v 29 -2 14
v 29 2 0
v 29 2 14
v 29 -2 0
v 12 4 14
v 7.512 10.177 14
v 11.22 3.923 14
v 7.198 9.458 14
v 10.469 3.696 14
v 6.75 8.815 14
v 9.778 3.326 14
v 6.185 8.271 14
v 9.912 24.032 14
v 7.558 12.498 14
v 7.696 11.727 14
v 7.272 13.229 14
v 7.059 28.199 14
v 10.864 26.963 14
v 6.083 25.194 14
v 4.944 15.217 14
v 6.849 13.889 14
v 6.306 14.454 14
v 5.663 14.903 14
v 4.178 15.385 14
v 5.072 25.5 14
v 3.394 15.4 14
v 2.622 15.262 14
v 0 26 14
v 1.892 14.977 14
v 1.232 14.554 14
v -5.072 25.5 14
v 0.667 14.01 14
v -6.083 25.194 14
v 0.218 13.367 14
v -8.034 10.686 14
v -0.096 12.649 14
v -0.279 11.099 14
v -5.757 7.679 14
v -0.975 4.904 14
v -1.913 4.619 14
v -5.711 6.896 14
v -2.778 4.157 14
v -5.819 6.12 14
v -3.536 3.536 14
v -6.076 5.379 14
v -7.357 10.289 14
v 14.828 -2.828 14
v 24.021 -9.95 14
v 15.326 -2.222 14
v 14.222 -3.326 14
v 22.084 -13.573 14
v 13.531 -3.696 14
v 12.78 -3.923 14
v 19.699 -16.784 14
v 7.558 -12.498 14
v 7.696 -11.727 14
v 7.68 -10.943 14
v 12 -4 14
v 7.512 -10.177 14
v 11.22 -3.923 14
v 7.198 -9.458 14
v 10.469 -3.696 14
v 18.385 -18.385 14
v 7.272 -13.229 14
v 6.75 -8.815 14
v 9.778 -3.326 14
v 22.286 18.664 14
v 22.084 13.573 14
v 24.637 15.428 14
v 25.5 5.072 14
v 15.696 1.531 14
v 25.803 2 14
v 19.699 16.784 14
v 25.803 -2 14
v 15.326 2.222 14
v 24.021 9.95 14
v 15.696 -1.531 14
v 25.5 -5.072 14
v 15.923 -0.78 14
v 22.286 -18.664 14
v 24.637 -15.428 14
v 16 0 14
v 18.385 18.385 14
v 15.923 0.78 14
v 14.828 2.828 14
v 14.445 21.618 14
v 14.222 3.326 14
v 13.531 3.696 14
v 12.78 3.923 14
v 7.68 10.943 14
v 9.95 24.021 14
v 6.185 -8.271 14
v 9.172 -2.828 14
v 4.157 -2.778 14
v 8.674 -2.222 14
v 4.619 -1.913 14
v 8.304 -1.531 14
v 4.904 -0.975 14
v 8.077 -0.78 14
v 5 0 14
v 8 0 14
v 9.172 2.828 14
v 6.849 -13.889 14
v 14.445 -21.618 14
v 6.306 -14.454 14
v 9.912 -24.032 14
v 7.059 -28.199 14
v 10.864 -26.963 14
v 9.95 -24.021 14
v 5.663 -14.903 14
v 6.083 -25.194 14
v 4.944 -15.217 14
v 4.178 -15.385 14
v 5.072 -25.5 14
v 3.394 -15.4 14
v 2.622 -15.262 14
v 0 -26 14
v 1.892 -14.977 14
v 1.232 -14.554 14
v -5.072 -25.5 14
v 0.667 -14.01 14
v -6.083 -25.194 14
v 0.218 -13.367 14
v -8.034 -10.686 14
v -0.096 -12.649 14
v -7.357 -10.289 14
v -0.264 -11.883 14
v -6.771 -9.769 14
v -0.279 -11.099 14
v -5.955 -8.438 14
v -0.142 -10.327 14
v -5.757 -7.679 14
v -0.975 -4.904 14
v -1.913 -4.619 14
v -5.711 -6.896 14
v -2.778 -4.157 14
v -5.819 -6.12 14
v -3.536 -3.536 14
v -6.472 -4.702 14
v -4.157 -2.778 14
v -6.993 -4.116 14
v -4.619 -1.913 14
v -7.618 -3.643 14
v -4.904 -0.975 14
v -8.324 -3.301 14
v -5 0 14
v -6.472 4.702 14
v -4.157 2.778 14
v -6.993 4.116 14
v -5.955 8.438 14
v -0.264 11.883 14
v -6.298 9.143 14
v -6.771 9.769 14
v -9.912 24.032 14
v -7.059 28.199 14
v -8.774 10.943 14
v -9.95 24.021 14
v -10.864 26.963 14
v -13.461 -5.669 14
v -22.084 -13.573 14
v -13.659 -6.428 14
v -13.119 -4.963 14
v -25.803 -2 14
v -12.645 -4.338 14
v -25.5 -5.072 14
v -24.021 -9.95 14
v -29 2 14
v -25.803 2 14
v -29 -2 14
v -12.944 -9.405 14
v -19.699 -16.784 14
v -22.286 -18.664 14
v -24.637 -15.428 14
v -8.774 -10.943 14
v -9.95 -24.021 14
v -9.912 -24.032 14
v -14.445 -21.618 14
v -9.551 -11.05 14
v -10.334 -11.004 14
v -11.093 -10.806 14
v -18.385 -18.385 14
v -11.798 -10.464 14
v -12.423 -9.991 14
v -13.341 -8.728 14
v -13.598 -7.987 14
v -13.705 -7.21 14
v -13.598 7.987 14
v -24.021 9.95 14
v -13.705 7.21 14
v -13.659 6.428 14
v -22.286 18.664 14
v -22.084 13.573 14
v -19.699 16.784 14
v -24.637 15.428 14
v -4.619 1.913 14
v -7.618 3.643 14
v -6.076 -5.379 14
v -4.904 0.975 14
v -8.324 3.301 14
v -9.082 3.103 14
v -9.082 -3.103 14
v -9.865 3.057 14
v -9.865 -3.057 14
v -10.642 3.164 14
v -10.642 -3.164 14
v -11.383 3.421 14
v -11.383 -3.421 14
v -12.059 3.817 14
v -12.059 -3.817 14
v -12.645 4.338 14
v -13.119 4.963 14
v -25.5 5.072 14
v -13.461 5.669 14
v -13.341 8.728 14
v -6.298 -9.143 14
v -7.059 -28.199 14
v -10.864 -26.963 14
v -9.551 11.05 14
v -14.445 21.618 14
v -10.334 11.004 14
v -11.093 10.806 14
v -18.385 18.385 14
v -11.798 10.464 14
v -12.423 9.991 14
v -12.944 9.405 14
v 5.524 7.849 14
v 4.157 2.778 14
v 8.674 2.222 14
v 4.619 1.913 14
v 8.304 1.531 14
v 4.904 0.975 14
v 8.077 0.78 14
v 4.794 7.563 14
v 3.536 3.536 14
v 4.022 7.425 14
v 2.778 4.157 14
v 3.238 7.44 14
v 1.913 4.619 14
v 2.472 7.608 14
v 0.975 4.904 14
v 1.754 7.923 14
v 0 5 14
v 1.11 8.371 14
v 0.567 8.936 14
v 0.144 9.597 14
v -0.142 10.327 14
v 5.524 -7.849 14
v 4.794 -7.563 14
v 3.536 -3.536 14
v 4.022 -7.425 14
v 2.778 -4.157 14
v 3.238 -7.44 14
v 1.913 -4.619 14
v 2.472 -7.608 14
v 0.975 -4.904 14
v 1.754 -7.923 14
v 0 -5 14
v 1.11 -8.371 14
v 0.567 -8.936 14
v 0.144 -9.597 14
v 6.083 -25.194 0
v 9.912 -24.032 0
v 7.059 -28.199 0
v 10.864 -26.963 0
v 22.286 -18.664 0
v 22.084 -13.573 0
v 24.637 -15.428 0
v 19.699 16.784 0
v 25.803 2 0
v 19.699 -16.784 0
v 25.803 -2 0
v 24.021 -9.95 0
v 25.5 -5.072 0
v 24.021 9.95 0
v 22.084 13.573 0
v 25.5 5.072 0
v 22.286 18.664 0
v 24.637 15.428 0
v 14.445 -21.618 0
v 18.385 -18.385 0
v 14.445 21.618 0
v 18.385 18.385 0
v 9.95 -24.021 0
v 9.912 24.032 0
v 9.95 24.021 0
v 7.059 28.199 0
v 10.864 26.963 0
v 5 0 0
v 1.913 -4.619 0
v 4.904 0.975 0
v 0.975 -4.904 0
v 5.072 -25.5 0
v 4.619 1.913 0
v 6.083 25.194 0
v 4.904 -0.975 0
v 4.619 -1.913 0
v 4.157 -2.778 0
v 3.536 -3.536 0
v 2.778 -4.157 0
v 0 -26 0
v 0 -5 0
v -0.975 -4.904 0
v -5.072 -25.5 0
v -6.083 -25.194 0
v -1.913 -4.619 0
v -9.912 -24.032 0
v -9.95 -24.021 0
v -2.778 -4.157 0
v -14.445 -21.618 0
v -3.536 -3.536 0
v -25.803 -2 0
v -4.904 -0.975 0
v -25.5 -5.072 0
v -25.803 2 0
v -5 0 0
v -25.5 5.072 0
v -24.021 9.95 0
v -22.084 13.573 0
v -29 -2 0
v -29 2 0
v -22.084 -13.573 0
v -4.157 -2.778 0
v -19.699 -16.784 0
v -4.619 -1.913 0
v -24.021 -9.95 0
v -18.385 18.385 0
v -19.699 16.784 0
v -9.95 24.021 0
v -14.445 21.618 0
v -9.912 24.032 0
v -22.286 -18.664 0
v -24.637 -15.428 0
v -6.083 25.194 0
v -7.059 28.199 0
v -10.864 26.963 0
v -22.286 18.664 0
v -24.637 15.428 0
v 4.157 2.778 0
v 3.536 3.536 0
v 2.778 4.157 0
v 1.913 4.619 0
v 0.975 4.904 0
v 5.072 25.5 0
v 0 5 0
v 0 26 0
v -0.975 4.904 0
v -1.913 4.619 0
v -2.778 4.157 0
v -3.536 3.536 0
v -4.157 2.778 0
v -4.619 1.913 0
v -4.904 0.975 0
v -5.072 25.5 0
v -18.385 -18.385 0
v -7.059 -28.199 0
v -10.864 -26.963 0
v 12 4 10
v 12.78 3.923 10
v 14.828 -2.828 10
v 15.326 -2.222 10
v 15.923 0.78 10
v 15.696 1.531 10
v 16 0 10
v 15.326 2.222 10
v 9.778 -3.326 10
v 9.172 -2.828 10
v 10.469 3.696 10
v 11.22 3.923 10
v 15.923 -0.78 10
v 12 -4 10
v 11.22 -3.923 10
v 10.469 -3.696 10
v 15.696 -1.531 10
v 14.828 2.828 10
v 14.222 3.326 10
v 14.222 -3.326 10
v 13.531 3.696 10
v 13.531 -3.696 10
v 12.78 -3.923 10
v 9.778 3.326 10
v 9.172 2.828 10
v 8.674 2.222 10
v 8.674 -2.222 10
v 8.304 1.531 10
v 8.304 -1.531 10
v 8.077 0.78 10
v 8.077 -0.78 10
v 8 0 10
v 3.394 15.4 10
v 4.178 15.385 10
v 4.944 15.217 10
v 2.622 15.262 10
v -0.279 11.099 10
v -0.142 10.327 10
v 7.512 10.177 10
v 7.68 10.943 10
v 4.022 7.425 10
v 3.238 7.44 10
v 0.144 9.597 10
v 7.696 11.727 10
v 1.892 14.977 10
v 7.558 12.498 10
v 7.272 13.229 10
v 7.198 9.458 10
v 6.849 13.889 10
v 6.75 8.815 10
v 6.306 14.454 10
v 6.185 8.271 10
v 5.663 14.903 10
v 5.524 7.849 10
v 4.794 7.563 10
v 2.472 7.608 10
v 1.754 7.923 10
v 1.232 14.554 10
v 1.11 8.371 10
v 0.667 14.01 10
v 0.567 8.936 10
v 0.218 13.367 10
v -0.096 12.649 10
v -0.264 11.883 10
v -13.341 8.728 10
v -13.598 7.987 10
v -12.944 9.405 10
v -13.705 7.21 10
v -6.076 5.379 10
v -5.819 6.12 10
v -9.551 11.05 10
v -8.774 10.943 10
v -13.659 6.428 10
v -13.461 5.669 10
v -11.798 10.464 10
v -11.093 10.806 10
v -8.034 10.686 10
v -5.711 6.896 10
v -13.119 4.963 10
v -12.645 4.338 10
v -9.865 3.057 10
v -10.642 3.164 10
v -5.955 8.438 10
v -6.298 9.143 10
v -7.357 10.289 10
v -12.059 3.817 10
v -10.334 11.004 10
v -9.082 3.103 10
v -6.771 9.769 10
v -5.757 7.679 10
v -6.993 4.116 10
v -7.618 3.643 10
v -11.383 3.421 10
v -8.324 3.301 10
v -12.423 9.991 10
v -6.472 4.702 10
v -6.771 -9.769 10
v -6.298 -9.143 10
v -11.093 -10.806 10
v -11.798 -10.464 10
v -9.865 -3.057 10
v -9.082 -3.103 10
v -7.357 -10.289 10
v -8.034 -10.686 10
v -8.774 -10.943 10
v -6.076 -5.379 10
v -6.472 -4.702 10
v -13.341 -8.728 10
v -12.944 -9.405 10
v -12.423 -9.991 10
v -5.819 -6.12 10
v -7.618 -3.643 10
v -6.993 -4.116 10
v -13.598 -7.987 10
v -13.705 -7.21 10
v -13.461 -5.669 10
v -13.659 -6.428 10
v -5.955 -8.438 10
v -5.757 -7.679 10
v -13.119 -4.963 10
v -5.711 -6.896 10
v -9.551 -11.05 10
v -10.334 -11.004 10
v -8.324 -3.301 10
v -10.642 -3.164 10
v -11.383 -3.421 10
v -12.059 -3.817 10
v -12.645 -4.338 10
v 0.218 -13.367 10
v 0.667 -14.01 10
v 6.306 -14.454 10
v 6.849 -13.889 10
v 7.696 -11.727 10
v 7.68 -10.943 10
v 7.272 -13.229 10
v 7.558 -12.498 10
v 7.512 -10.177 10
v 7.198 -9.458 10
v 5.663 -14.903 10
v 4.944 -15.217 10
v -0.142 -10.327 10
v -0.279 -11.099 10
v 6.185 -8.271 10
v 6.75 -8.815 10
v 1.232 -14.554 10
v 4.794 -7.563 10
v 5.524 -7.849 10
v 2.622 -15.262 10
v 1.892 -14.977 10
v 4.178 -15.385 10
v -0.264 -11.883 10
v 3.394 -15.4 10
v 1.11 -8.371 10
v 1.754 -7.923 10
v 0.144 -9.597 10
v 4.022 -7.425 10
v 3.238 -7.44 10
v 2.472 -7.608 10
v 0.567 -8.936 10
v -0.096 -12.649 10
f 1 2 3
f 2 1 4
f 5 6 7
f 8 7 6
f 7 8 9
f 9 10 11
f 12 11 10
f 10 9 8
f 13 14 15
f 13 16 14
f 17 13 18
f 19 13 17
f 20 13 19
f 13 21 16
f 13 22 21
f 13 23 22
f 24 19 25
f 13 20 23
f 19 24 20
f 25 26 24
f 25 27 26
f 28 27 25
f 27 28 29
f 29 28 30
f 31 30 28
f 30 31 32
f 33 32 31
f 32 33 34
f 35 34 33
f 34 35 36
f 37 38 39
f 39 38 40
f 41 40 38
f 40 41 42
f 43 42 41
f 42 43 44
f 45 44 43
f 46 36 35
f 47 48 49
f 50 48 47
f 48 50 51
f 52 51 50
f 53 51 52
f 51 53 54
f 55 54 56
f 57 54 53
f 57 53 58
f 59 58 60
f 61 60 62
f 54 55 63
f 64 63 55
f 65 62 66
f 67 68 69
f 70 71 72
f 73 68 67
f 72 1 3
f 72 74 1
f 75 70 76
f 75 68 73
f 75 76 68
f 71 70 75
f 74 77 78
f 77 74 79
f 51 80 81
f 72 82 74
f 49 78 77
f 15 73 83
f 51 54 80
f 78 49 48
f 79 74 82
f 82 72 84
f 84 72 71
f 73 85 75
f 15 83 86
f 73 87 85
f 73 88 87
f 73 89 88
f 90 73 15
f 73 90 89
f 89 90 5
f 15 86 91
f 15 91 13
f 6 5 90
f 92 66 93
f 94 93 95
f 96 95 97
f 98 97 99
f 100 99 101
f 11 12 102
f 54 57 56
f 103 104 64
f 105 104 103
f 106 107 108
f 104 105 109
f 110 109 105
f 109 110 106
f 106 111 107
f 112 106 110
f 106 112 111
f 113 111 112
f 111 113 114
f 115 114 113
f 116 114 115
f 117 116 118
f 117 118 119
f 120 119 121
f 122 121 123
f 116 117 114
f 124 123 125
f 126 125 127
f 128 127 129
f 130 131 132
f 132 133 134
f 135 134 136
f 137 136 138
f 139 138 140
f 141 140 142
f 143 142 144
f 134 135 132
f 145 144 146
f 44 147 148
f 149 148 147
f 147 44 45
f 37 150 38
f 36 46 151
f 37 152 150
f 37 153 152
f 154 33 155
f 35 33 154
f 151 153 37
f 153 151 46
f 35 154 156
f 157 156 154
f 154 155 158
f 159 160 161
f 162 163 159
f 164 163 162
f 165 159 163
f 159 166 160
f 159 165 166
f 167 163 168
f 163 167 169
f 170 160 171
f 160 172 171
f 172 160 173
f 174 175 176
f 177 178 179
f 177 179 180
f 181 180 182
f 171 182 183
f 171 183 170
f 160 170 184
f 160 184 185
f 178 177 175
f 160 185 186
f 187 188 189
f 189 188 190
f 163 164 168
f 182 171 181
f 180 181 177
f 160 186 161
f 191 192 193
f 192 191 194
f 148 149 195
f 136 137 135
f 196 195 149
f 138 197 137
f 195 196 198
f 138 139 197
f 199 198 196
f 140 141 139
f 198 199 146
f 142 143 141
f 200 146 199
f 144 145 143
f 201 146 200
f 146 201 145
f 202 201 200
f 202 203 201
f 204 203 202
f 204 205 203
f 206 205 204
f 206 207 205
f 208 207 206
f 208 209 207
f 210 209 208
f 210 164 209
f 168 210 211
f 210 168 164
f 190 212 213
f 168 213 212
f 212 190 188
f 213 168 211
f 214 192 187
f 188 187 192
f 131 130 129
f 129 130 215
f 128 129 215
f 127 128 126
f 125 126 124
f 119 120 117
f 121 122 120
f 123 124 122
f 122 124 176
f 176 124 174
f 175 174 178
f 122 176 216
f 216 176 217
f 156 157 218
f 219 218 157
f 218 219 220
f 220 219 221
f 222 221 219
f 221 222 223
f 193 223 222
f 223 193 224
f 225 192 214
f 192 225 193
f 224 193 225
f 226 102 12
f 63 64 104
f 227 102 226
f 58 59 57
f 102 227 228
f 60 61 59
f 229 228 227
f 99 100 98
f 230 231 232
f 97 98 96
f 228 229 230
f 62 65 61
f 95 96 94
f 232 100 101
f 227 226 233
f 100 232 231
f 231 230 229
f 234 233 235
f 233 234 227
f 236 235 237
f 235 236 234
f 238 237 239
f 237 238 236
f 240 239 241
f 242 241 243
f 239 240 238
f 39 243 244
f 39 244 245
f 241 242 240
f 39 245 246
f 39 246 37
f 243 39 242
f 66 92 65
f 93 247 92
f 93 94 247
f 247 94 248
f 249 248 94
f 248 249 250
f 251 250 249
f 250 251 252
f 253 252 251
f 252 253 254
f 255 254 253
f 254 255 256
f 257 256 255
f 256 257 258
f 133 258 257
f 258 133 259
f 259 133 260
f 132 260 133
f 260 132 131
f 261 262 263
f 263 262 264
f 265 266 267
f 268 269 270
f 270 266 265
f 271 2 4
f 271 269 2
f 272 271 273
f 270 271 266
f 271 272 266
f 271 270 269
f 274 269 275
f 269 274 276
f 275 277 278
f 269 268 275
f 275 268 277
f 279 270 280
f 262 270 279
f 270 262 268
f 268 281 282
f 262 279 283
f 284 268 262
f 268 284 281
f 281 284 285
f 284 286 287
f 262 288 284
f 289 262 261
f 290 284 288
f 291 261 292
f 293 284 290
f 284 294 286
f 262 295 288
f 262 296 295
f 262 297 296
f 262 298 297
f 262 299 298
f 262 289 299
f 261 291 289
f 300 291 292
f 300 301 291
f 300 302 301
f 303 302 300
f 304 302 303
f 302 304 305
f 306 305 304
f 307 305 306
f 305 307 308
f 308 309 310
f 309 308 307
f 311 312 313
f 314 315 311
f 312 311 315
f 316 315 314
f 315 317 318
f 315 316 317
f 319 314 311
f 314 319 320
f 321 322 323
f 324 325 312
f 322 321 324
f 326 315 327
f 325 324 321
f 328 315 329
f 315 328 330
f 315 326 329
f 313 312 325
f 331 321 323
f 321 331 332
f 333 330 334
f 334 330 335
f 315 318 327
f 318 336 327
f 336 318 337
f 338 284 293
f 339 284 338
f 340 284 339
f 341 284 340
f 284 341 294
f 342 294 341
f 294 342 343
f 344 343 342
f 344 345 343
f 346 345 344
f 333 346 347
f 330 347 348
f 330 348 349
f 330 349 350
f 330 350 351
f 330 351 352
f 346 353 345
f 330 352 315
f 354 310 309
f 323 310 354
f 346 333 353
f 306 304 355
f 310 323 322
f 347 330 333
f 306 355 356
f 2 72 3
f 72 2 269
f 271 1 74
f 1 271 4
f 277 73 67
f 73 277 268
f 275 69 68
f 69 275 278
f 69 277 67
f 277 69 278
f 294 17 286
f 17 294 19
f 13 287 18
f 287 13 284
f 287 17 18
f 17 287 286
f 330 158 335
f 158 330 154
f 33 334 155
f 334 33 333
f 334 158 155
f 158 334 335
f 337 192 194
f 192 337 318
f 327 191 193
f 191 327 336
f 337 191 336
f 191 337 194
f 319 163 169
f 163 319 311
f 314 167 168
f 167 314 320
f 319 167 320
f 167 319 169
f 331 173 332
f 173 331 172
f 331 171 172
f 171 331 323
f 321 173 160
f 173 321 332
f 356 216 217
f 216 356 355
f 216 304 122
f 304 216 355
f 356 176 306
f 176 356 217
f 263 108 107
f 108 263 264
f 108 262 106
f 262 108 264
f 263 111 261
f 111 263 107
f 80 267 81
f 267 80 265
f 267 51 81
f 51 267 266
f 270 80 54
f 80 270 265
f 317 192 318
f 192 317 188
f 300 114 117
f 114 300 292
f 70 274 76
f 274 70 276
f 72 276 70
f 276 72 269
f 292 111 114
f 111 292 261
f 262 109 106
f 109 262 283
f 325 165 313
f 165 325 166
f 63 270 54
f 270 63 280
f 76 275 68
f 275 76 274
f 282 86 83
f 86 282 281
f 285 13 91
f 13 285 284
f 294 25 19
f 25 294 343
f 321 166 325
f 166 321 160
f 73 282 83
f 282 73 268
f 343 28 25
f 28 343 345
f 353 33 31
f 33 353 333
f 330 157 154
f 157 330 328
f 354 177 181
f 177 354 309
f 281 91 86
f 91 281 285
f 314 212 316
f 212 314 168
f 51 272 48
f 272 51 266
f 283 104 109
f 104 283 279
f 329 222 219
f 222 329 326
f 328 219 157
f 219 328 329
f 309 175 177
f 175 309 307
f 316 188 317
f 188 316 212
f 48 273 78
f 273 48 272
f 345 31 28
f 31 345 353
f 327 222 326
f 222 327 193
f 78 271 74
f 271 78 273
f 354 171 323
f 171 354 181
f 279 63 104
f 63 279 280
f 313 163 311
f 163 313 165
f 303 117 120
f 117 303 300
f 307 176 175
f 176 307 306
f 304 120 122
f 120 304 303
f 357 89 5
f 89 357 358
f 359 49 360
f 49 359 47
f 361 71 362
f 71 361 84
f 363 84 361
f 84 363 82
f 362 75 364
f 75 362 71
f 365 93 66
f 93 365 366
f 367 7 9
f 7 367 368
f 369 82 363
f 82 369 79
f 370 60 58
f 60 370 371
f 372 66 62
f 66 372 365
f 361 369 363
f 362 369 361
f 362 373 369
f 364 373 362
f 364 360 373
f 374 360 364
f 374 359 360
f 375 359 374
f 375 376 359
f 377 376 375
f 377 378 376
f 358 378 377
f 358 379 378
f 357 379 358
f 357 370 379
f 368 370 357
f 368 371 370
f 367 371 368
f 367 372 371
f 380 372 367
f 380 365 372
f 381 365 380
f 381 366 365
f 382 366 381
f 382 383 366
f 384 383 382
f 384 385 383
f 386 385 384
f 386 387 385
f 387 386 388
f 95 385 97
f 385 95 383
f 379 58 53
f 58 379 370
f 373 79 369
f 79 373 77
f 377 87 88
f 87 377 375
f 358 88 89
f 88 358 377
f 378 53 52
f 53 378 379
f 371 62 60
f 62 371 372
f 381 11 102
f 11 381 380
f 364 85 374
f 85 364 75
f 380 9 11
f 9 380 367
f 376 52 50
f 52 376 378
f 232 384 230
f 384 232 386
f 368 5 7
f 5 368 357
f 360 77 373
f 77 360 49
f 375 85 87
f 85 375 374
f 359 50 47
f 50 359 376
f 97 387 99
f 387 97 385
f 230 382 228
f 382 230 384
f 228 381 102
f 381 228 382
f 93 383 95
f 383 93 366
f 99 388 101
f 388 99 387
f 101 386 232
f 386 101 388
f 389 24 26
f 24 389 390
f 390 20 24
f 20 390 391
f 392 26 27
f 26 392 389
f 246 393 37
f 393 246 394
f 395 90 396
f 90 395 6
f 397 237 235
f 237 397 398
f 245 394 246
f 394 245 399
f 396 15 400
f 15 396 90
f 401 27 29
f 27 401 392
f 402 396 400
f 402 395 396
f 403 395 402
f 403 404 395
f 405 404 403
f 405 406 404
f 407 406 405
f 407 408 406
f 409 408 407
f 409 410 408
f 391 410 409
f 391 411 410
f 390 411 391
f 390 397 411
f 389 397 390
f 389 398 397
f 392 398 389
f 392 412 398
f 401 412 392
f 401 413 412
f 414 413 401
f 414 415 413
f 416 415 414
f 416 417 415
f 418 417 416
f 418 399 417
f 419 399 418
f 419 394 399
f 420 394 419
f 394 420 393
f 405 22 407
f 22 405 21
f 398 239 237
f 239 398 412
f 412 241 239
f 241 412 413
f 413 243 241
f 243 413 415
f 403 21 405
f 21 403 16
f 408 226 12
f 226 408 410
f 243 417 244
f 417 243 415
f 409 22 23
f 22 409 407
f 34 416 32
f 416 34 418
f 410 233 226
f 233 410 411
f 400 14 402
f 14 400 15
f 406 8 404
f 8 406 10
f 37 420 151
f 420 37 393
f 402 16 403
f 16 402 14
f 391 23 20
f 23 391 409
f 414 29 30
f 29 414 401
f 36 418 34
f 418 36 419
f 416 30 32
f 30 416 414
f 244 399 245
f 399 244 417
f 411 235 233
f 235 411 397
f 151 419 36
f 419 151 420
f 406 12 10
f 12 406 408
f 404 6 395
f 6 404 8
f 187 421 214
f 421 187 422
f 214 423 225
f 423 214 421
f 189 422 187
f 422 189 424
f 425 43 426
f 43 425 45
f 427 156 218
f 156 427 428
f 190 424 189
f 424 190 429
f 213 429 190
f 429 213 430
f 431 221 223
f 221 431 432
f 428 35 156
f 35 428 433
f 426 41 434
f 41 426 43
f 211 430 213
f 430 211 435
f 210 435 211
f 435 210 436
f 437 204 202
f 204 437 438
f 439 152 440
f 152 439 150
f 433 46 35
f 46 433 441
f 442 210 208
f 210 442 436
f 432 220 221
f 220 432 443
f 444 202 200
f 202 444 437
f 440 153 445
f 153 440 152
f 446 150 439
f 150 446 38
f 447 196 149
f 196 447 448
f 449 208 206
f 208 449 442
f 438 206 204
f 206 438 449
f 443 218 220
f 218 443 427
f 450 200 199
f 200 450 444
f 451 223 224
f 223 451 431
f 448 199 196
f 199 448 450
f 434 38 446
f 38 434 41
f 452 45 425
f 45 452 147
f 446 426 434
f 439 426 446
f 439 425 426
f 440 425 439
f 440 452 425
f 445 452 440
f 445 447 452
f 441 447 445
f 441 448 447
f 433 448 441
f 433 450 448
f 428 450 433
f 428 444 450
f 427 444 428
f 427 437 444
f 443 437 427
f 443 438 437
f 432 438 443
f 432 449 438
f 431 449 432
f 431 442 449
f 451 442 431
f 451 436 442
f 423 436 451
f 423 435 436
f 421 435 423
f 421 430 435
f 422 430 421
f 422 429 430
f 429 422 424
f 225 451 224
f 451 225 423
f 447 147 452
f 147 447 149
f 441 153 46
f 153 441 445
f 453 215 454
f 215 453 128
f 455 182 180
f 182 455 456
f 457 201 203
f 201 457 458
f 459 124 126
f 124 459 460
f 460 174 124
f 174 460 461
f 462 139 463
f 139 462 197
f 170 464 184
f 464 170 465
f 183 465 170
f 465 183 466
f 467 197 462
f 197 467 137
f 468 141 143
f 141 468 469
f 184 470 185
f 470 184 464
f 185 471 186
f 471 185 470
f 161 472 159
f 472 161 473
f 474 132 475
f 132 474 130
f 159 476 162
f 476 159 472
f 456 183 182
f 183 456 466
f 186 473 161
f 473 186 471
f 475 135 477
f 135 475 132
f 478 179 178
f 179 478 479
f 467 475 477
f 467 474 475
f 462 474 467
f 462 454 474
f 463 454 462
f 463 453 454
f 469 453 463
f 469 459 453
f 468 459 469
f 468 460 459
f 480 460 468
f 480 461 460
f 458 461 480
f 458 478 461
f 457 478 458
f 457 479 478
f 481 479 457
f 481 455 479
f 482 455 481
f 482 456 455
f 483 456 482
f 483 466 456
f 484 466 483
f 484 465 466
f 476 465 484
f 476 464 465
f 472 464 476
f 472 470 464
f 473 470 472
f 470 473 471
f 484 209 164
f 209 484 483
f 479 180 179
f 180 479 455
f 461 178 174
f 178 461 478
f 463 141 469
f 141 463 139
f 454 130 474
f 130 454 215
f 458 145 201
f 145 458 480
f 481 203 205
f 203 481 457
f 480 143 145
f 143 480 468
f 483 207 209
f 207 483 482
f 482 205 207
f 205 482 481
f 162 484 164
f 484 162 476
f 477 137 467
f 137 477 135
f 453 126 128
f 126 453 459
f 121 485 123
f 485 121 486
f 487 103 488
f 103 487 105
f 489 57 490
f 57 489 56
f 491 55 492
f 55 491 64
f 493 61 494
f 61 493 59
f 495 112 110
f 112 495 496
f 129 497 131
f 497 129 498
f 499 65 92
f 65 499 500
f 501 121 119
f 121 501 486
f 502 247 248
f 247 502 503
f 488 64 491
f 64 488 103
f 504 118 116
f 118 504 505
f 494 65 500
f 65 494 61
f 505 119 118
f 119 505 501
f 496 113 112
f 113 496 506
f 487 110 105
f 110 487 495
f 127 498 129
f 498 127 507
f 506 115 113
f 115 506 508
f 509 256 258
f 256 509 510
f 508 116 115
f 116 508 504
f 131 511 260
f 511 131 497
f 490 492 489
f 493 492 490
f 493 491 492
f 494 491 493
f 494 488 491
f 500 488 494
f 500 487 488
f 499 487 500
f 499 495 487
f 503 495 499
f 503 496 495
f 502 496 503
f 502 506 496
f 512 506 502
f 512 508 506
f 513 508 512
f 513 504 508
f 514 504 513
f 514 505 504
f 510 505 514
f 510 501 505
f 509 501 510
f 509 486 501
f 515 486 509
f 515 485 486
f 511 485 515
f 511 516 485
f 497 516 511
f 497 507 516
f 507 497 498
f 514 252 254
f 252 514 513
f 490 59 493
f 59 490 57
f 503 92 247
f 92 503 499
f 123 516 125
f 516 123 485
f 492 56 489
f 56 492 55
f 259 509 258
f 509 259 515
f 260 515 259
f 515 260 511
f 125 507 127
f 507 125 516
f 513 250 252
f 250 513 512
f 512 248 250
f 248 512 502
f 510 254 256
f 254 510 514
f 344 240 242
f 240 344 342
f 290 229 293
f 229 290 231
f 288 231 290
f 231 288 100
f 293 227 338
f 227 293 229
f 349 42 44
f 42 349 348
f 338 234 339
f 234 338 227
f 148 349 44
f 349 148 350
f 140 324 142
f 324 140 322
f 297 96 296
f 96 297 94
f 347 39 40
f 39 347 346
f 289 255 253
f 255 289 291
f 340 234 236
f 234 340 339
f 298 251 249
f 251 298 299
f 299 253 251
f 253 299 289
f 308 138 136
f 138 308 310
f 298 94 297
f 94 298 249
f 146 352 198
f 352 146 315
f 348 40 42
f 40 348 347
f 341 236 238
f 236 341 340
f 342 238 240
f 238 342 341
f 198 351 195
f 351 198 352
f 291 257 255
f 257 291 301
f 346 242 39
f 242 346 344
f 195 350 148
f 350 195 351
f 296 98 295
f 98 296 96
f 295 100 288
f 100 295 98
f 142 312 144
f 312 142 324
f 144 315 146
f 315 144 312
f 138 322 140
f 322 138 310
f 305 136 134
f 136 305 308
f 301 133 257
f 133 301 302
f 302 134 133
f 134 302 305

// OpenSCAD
$fn = 32;

// ----------------------------------------------------------------------
// Spur blank: lightened gear blank
// ----------------------------------------------------------------------

// --- parameters (mm) ---
disc_r = 26;              // blank root radius
disc_t = 14;              // blank thickness
n_teeth = 10;             // stub tooth count
tooth_w = 4;              // tooth width at the root
tooth_h = 3;              // tooth height above the root
bore_r = 5;               // central bore radius
ring_r = 12;              // lightening pocket ring radius
pocket_r = 4;             // lightening pocket radius

out_r = disc_r + tooth_h;  // tip radius
bbox_x = 58.0;  // measured width over the teeth
bbox_y = 56.4;  // measured depth over the teeth

difference() {
union() {
  cylinder(r = disc_r, h = disc_t);
  for (i = [0 : n_teeth - 1])
    rotate([0, 0, i * 360 / n_teeth])
      translate([disc_r - 1, -tooth_w / 2, 0])
        cube([tooth_h + 1, tooth_w, disc_t]);
}
  translate([0, 0, -1]) cylinder(r = bore_r, h = disc_t + 2);
  for (i = [0 : 5])
    rotate([0, 0, i * 72])
      translate([ring_r, 0, disc_t - 4])
        cylinder(r = pocket_r, h = 5);
}
